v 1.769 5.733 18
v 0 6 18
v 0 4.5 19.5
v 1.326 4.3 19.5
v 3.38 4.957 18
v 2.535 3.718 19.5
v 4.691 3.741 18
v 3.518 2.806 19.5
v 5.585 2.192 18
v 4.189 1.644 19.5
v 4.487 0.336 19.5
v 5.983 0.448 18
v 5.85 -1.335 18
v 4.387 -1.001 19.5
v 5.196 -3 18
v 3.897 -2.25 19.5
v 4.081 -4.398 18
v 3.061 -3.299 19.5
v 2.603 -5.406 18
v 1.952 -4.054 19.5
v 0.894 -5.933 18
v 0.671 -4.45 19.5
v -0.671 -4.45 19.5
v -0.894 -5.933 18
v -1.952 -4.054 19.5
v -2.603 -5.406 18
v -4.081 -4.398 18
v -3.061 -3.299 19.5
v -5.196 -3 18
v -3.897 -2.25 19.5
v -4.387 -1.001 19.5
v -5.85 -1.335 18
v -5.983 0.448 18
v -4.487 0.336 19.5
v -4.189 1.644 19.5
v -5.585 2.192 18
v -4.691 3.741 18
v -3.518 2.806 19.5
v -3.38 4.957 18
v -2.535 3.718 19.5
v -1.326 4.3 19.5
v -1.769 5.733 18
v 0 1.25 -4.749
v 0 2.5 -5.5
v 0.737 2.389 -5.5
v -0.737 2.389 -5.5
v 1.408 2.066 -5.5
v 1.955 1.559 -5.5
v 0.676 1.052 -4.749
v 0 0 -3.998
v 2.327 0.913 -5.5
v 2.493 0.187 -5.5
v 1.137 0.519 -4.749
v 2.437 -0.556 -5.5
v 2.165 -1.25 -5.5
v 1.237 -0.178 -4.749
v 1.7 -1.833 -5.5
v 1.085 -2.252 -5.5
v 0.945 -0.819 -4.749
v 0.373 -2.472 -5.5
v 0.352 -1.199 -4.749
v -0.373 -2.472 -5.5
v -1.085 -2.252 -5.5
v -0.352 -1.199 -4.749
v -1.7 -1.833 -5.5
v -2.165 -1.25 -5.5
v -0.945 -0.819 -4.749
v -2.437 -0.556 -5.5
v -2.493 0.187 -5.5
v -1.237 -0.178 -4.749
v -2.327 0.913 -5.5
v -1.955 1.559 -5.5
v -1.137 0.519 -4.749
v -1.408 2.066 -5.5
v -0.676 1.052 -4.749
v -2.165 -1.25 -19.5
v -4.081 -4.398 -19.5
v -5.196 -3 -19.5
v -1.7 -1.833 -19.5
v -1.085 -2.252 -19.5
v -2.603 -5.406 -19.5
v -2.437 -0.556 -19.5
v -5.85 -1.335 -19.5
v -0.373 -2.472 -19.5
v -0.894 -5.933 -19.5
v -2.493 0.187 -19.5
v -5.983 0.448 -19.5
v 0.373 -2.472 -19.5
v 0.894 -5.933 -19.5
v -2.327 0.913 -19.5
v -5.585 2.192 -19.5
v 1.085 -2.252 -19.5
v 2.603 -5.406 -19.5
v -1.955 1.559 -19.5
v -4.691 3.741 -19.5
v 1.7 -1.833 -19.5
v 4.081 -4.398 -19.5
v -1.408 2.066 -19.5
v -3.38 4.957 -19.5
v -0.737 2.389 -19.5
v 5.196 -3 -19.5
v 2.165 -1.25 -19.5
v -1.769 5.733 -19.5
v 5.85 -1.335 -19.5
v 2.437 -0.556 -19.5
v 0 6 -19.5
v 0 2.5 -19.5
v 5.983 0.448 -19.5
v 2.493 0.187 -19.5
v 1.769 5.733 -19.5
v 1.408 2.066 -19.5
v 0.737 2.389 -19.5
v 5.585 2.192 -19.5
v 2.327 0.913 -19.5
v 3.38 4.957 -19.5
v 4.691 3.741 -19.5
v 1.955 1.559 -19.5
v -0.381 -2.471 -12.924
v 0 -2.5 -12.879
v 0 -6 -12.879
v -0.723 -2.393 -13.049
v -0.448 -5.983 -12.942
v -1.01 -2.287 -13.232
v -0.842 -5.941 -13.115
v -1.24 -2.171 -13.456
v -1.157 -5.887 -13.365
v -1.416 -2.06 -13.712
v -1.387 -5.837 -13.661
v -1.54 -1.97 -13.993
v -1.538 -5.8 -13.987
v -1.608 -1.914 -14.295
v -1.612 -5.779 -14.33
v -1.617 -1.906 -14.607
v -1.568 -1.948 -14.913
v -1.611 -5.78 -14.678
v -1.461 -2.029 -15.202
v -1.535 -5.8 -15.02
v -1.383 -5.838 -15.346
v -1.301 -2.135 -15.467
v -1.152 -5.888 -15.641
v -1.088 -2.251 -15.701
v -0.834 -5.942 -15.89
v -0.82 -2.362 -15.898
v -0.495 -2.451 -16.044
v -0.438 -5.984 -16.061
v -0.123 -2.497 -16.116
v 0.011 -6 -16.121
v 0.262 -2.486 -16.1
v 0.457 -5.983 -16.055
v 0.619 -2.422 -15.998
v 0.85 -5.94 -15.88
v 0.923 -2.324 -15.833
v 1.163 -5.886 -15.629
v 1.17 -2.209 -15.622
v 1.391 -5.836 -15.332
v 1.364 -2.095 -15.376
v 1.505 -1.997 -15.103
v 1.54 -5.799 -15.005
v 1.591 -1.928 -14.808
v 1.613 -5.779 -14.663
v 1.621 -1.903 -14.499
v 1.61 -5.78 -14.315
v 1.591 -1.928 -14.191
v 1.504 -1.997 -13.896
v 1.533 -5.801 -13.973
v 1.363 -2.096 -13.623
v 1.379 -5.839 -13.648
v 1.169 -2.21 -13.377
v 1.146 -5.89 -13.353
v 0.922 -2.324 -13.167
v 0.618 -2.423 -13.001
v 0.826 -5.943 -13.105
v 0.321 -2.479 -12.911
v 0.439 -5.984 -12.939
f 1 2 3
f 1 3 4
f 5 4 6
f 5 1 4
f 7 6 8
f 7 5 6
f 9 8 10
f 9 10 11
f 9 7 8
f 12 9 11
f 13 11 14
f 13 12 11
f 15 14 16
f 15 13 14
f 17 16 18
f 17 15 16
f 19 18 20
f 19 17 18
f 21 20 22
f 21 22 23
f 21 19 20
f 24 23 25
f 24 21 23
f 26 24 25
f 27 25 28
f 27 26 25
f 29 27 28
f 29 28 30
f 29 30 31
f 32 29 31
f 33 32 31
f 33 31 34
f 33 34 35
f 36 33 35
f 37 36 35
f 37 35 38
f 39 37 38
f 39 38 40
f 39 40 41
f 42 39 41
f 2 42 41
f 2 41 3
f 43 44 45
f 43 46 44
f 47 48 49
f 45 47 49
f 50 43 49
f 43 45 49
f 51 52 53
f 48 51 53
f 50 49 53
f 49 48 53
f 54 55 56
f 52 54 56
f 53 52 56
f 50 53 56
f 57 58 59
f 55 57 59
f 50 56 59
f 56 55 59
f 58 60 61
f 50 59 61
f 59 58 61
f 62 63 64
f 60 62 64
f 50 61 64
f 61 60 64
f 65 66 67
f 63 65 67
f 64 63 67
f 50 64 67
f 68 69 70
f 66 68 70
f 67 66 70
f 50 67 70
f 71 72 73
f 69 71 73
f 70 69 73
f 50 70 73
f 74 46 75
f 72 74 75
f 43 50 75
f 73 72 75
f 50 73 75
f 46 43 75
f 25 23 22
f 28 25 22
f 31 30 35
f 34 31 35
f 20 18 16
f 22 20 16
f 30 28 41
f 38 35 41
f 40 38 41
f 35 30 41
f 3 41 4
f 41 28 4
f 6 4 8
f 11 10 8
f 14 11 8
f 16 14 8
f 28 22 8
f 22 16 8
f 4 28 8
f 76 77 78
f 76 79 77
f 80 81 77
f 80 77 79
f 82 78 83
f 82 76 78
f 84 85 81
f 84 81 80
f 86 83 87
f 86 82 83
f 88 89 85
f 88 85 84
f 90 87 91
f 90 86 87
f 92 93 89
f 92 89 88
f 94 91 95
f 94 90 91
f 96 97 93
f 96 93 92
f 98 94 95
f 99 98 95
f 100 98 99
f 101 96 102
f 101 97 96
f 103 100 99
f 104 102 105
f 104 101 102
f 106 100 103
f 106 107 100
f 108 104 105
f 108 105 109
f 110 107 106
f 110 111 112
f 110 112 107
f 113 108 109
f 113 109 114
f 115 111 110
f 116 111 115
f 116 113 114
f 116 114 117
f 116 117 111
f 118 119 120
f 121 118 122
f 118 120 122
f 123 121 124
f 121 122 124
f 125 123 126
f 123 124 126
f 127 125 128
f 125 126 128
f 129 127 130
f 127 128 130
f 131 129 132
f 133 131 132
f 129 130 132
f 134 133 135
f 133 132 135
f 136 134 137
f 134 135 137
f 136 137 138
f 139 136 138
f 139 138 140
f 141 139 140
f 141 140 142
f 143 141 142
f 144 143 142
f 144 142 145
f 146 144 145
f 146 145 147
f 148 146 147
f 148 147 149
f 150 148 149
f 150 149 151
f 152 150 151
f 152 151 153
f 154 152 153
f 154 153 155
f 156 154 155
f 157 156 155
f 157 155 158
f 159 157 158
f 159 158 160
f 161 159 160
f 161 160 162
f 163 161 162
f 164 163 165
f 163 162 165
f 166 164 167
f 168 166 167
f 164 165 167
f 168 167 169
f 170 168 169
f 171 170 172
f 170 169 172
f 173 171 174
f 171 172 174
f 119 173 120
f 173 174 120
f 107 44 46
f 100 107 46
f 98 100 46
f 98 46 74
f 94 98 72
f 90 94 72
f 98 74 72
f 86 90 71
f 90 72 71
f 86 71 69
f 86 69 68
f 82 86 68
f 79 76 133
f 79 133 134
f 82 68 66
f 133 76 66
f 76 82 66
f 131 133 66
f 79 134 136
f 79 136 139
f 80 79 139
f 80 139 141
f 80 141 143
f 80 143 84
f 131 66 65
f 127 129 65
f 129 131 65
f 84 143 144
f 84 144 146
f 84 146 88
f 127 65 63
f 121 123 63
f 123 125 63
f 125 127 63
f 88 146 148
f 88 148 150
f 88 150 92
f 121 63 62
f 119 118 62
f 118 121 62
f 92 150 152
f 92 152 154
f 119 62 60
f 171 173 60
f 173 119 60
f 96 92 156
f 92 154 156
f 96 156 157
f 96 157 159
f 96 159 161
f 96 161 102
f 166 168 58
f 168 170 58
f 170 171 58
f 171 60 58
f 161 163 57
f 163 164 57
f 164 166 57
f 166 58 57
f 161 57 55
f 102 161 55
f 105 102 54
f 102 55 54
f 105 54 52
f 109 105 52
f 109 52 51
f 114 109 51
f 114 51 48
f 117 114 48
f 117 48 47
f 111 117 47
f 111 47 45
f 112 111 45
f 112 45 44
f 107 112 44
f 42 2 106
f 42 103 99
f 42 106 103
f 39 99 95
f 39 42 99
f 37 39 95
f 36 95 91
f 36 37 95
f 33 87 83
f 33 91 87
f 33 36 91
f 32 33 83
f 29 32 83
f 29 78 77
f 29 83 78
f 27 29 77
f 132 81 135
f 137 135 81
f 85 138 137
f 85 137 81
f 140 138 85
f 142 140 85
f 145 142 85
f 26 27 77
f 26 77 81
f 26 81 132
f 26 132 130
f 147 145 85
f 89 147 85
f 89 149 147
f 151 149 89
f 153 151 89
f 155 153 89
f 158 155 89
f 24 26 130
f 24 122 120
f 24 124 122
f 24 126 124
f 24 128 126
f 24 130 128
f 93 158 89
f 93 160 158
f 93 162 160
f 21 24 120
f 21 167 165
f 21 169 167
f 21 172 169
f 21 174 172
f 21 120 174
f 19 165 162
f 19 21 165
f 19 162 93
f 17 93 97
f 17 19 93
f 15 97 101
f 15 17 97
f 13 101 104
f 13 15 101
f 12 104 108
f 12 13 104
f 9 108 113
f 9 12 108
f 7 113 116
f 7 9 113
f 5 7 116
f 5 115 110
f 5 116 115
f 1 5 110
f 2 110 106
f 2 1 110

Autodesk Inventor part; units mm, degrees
ref_plane "YZ Plane" through (0, 0, 0) normal (1, 0, 0) x (0, 1, 0)
ref_plane "XZ Plane" through (0, 0, 0) normal (0, 1, 0) x (-1, 0, 0)
ref_plane "XY Plane" through (0, 0, 0) normal (0, 0, 1) x (1, 0, 0)
sketch "Sketch3" plane through (0, 0, 0) normal (1, 0, 0) x (0, 1, 0)
  line L0 (6, 19.5) -> (0, 19.5)
  line L1 (0, 19.5) -> (0, -19.5)
  line L2 (0, -19.5) -> (6, -19.5)
  line L3 (6, -19.5) -> (6, 19.5)
  point P0 (0, 0)
  dimension "d11" = 39
  dimension "d12" = 0
  dimension "d13" = 6
  dimension "d15" = 19.5
revolve "Revolution2" add sketch "Sketch3" angle 360 about axis through (0, 0, 19.5) along (0, 0, -1)
sketch "Sketch6" plane through (0, 0, -19.5) normal (0, 0, -1) x (-1, 0, 0)
  circle A0 centre (0, 0) radius 2.5
  dimension "d39" = 5
hole "Hole3" at (0, 0, -19.5) direction (0, 0, 1) diameter 5 depth 14 tip angle 118
sketch "Sketch7" plane through (0, 0, 0) normal (0, 1, 0) x (-1, 0, 0)
  circle A0 centre (0, -14.5) radius 2
  line L0 (-6, -19.5) -> (6, -19.5) projected
  point P0 (0, 0)
  dimension "d47" = 4
  dimension "d49" = 5
hole "Hole4" at (0, 0, -14.5) direction (0, -1, 0) diameter 3.242 end through all thread size "M4x0.7" class "6H" standard "ISO Metric profile"
thread "Thread2" size "M12x1.75" class "6g" standard "ANSI Metric M Profile" length 29
chamfer "Chamfer3" distance 1.5 angle 45 1 edges at (0, -6, 19.5)
equation "\"d15\" = 0.5 * d11"
equation "\"d40\" = d39"
properties part number "Spindle Iso M12 Setscrew" material "Aluminum 6061"
